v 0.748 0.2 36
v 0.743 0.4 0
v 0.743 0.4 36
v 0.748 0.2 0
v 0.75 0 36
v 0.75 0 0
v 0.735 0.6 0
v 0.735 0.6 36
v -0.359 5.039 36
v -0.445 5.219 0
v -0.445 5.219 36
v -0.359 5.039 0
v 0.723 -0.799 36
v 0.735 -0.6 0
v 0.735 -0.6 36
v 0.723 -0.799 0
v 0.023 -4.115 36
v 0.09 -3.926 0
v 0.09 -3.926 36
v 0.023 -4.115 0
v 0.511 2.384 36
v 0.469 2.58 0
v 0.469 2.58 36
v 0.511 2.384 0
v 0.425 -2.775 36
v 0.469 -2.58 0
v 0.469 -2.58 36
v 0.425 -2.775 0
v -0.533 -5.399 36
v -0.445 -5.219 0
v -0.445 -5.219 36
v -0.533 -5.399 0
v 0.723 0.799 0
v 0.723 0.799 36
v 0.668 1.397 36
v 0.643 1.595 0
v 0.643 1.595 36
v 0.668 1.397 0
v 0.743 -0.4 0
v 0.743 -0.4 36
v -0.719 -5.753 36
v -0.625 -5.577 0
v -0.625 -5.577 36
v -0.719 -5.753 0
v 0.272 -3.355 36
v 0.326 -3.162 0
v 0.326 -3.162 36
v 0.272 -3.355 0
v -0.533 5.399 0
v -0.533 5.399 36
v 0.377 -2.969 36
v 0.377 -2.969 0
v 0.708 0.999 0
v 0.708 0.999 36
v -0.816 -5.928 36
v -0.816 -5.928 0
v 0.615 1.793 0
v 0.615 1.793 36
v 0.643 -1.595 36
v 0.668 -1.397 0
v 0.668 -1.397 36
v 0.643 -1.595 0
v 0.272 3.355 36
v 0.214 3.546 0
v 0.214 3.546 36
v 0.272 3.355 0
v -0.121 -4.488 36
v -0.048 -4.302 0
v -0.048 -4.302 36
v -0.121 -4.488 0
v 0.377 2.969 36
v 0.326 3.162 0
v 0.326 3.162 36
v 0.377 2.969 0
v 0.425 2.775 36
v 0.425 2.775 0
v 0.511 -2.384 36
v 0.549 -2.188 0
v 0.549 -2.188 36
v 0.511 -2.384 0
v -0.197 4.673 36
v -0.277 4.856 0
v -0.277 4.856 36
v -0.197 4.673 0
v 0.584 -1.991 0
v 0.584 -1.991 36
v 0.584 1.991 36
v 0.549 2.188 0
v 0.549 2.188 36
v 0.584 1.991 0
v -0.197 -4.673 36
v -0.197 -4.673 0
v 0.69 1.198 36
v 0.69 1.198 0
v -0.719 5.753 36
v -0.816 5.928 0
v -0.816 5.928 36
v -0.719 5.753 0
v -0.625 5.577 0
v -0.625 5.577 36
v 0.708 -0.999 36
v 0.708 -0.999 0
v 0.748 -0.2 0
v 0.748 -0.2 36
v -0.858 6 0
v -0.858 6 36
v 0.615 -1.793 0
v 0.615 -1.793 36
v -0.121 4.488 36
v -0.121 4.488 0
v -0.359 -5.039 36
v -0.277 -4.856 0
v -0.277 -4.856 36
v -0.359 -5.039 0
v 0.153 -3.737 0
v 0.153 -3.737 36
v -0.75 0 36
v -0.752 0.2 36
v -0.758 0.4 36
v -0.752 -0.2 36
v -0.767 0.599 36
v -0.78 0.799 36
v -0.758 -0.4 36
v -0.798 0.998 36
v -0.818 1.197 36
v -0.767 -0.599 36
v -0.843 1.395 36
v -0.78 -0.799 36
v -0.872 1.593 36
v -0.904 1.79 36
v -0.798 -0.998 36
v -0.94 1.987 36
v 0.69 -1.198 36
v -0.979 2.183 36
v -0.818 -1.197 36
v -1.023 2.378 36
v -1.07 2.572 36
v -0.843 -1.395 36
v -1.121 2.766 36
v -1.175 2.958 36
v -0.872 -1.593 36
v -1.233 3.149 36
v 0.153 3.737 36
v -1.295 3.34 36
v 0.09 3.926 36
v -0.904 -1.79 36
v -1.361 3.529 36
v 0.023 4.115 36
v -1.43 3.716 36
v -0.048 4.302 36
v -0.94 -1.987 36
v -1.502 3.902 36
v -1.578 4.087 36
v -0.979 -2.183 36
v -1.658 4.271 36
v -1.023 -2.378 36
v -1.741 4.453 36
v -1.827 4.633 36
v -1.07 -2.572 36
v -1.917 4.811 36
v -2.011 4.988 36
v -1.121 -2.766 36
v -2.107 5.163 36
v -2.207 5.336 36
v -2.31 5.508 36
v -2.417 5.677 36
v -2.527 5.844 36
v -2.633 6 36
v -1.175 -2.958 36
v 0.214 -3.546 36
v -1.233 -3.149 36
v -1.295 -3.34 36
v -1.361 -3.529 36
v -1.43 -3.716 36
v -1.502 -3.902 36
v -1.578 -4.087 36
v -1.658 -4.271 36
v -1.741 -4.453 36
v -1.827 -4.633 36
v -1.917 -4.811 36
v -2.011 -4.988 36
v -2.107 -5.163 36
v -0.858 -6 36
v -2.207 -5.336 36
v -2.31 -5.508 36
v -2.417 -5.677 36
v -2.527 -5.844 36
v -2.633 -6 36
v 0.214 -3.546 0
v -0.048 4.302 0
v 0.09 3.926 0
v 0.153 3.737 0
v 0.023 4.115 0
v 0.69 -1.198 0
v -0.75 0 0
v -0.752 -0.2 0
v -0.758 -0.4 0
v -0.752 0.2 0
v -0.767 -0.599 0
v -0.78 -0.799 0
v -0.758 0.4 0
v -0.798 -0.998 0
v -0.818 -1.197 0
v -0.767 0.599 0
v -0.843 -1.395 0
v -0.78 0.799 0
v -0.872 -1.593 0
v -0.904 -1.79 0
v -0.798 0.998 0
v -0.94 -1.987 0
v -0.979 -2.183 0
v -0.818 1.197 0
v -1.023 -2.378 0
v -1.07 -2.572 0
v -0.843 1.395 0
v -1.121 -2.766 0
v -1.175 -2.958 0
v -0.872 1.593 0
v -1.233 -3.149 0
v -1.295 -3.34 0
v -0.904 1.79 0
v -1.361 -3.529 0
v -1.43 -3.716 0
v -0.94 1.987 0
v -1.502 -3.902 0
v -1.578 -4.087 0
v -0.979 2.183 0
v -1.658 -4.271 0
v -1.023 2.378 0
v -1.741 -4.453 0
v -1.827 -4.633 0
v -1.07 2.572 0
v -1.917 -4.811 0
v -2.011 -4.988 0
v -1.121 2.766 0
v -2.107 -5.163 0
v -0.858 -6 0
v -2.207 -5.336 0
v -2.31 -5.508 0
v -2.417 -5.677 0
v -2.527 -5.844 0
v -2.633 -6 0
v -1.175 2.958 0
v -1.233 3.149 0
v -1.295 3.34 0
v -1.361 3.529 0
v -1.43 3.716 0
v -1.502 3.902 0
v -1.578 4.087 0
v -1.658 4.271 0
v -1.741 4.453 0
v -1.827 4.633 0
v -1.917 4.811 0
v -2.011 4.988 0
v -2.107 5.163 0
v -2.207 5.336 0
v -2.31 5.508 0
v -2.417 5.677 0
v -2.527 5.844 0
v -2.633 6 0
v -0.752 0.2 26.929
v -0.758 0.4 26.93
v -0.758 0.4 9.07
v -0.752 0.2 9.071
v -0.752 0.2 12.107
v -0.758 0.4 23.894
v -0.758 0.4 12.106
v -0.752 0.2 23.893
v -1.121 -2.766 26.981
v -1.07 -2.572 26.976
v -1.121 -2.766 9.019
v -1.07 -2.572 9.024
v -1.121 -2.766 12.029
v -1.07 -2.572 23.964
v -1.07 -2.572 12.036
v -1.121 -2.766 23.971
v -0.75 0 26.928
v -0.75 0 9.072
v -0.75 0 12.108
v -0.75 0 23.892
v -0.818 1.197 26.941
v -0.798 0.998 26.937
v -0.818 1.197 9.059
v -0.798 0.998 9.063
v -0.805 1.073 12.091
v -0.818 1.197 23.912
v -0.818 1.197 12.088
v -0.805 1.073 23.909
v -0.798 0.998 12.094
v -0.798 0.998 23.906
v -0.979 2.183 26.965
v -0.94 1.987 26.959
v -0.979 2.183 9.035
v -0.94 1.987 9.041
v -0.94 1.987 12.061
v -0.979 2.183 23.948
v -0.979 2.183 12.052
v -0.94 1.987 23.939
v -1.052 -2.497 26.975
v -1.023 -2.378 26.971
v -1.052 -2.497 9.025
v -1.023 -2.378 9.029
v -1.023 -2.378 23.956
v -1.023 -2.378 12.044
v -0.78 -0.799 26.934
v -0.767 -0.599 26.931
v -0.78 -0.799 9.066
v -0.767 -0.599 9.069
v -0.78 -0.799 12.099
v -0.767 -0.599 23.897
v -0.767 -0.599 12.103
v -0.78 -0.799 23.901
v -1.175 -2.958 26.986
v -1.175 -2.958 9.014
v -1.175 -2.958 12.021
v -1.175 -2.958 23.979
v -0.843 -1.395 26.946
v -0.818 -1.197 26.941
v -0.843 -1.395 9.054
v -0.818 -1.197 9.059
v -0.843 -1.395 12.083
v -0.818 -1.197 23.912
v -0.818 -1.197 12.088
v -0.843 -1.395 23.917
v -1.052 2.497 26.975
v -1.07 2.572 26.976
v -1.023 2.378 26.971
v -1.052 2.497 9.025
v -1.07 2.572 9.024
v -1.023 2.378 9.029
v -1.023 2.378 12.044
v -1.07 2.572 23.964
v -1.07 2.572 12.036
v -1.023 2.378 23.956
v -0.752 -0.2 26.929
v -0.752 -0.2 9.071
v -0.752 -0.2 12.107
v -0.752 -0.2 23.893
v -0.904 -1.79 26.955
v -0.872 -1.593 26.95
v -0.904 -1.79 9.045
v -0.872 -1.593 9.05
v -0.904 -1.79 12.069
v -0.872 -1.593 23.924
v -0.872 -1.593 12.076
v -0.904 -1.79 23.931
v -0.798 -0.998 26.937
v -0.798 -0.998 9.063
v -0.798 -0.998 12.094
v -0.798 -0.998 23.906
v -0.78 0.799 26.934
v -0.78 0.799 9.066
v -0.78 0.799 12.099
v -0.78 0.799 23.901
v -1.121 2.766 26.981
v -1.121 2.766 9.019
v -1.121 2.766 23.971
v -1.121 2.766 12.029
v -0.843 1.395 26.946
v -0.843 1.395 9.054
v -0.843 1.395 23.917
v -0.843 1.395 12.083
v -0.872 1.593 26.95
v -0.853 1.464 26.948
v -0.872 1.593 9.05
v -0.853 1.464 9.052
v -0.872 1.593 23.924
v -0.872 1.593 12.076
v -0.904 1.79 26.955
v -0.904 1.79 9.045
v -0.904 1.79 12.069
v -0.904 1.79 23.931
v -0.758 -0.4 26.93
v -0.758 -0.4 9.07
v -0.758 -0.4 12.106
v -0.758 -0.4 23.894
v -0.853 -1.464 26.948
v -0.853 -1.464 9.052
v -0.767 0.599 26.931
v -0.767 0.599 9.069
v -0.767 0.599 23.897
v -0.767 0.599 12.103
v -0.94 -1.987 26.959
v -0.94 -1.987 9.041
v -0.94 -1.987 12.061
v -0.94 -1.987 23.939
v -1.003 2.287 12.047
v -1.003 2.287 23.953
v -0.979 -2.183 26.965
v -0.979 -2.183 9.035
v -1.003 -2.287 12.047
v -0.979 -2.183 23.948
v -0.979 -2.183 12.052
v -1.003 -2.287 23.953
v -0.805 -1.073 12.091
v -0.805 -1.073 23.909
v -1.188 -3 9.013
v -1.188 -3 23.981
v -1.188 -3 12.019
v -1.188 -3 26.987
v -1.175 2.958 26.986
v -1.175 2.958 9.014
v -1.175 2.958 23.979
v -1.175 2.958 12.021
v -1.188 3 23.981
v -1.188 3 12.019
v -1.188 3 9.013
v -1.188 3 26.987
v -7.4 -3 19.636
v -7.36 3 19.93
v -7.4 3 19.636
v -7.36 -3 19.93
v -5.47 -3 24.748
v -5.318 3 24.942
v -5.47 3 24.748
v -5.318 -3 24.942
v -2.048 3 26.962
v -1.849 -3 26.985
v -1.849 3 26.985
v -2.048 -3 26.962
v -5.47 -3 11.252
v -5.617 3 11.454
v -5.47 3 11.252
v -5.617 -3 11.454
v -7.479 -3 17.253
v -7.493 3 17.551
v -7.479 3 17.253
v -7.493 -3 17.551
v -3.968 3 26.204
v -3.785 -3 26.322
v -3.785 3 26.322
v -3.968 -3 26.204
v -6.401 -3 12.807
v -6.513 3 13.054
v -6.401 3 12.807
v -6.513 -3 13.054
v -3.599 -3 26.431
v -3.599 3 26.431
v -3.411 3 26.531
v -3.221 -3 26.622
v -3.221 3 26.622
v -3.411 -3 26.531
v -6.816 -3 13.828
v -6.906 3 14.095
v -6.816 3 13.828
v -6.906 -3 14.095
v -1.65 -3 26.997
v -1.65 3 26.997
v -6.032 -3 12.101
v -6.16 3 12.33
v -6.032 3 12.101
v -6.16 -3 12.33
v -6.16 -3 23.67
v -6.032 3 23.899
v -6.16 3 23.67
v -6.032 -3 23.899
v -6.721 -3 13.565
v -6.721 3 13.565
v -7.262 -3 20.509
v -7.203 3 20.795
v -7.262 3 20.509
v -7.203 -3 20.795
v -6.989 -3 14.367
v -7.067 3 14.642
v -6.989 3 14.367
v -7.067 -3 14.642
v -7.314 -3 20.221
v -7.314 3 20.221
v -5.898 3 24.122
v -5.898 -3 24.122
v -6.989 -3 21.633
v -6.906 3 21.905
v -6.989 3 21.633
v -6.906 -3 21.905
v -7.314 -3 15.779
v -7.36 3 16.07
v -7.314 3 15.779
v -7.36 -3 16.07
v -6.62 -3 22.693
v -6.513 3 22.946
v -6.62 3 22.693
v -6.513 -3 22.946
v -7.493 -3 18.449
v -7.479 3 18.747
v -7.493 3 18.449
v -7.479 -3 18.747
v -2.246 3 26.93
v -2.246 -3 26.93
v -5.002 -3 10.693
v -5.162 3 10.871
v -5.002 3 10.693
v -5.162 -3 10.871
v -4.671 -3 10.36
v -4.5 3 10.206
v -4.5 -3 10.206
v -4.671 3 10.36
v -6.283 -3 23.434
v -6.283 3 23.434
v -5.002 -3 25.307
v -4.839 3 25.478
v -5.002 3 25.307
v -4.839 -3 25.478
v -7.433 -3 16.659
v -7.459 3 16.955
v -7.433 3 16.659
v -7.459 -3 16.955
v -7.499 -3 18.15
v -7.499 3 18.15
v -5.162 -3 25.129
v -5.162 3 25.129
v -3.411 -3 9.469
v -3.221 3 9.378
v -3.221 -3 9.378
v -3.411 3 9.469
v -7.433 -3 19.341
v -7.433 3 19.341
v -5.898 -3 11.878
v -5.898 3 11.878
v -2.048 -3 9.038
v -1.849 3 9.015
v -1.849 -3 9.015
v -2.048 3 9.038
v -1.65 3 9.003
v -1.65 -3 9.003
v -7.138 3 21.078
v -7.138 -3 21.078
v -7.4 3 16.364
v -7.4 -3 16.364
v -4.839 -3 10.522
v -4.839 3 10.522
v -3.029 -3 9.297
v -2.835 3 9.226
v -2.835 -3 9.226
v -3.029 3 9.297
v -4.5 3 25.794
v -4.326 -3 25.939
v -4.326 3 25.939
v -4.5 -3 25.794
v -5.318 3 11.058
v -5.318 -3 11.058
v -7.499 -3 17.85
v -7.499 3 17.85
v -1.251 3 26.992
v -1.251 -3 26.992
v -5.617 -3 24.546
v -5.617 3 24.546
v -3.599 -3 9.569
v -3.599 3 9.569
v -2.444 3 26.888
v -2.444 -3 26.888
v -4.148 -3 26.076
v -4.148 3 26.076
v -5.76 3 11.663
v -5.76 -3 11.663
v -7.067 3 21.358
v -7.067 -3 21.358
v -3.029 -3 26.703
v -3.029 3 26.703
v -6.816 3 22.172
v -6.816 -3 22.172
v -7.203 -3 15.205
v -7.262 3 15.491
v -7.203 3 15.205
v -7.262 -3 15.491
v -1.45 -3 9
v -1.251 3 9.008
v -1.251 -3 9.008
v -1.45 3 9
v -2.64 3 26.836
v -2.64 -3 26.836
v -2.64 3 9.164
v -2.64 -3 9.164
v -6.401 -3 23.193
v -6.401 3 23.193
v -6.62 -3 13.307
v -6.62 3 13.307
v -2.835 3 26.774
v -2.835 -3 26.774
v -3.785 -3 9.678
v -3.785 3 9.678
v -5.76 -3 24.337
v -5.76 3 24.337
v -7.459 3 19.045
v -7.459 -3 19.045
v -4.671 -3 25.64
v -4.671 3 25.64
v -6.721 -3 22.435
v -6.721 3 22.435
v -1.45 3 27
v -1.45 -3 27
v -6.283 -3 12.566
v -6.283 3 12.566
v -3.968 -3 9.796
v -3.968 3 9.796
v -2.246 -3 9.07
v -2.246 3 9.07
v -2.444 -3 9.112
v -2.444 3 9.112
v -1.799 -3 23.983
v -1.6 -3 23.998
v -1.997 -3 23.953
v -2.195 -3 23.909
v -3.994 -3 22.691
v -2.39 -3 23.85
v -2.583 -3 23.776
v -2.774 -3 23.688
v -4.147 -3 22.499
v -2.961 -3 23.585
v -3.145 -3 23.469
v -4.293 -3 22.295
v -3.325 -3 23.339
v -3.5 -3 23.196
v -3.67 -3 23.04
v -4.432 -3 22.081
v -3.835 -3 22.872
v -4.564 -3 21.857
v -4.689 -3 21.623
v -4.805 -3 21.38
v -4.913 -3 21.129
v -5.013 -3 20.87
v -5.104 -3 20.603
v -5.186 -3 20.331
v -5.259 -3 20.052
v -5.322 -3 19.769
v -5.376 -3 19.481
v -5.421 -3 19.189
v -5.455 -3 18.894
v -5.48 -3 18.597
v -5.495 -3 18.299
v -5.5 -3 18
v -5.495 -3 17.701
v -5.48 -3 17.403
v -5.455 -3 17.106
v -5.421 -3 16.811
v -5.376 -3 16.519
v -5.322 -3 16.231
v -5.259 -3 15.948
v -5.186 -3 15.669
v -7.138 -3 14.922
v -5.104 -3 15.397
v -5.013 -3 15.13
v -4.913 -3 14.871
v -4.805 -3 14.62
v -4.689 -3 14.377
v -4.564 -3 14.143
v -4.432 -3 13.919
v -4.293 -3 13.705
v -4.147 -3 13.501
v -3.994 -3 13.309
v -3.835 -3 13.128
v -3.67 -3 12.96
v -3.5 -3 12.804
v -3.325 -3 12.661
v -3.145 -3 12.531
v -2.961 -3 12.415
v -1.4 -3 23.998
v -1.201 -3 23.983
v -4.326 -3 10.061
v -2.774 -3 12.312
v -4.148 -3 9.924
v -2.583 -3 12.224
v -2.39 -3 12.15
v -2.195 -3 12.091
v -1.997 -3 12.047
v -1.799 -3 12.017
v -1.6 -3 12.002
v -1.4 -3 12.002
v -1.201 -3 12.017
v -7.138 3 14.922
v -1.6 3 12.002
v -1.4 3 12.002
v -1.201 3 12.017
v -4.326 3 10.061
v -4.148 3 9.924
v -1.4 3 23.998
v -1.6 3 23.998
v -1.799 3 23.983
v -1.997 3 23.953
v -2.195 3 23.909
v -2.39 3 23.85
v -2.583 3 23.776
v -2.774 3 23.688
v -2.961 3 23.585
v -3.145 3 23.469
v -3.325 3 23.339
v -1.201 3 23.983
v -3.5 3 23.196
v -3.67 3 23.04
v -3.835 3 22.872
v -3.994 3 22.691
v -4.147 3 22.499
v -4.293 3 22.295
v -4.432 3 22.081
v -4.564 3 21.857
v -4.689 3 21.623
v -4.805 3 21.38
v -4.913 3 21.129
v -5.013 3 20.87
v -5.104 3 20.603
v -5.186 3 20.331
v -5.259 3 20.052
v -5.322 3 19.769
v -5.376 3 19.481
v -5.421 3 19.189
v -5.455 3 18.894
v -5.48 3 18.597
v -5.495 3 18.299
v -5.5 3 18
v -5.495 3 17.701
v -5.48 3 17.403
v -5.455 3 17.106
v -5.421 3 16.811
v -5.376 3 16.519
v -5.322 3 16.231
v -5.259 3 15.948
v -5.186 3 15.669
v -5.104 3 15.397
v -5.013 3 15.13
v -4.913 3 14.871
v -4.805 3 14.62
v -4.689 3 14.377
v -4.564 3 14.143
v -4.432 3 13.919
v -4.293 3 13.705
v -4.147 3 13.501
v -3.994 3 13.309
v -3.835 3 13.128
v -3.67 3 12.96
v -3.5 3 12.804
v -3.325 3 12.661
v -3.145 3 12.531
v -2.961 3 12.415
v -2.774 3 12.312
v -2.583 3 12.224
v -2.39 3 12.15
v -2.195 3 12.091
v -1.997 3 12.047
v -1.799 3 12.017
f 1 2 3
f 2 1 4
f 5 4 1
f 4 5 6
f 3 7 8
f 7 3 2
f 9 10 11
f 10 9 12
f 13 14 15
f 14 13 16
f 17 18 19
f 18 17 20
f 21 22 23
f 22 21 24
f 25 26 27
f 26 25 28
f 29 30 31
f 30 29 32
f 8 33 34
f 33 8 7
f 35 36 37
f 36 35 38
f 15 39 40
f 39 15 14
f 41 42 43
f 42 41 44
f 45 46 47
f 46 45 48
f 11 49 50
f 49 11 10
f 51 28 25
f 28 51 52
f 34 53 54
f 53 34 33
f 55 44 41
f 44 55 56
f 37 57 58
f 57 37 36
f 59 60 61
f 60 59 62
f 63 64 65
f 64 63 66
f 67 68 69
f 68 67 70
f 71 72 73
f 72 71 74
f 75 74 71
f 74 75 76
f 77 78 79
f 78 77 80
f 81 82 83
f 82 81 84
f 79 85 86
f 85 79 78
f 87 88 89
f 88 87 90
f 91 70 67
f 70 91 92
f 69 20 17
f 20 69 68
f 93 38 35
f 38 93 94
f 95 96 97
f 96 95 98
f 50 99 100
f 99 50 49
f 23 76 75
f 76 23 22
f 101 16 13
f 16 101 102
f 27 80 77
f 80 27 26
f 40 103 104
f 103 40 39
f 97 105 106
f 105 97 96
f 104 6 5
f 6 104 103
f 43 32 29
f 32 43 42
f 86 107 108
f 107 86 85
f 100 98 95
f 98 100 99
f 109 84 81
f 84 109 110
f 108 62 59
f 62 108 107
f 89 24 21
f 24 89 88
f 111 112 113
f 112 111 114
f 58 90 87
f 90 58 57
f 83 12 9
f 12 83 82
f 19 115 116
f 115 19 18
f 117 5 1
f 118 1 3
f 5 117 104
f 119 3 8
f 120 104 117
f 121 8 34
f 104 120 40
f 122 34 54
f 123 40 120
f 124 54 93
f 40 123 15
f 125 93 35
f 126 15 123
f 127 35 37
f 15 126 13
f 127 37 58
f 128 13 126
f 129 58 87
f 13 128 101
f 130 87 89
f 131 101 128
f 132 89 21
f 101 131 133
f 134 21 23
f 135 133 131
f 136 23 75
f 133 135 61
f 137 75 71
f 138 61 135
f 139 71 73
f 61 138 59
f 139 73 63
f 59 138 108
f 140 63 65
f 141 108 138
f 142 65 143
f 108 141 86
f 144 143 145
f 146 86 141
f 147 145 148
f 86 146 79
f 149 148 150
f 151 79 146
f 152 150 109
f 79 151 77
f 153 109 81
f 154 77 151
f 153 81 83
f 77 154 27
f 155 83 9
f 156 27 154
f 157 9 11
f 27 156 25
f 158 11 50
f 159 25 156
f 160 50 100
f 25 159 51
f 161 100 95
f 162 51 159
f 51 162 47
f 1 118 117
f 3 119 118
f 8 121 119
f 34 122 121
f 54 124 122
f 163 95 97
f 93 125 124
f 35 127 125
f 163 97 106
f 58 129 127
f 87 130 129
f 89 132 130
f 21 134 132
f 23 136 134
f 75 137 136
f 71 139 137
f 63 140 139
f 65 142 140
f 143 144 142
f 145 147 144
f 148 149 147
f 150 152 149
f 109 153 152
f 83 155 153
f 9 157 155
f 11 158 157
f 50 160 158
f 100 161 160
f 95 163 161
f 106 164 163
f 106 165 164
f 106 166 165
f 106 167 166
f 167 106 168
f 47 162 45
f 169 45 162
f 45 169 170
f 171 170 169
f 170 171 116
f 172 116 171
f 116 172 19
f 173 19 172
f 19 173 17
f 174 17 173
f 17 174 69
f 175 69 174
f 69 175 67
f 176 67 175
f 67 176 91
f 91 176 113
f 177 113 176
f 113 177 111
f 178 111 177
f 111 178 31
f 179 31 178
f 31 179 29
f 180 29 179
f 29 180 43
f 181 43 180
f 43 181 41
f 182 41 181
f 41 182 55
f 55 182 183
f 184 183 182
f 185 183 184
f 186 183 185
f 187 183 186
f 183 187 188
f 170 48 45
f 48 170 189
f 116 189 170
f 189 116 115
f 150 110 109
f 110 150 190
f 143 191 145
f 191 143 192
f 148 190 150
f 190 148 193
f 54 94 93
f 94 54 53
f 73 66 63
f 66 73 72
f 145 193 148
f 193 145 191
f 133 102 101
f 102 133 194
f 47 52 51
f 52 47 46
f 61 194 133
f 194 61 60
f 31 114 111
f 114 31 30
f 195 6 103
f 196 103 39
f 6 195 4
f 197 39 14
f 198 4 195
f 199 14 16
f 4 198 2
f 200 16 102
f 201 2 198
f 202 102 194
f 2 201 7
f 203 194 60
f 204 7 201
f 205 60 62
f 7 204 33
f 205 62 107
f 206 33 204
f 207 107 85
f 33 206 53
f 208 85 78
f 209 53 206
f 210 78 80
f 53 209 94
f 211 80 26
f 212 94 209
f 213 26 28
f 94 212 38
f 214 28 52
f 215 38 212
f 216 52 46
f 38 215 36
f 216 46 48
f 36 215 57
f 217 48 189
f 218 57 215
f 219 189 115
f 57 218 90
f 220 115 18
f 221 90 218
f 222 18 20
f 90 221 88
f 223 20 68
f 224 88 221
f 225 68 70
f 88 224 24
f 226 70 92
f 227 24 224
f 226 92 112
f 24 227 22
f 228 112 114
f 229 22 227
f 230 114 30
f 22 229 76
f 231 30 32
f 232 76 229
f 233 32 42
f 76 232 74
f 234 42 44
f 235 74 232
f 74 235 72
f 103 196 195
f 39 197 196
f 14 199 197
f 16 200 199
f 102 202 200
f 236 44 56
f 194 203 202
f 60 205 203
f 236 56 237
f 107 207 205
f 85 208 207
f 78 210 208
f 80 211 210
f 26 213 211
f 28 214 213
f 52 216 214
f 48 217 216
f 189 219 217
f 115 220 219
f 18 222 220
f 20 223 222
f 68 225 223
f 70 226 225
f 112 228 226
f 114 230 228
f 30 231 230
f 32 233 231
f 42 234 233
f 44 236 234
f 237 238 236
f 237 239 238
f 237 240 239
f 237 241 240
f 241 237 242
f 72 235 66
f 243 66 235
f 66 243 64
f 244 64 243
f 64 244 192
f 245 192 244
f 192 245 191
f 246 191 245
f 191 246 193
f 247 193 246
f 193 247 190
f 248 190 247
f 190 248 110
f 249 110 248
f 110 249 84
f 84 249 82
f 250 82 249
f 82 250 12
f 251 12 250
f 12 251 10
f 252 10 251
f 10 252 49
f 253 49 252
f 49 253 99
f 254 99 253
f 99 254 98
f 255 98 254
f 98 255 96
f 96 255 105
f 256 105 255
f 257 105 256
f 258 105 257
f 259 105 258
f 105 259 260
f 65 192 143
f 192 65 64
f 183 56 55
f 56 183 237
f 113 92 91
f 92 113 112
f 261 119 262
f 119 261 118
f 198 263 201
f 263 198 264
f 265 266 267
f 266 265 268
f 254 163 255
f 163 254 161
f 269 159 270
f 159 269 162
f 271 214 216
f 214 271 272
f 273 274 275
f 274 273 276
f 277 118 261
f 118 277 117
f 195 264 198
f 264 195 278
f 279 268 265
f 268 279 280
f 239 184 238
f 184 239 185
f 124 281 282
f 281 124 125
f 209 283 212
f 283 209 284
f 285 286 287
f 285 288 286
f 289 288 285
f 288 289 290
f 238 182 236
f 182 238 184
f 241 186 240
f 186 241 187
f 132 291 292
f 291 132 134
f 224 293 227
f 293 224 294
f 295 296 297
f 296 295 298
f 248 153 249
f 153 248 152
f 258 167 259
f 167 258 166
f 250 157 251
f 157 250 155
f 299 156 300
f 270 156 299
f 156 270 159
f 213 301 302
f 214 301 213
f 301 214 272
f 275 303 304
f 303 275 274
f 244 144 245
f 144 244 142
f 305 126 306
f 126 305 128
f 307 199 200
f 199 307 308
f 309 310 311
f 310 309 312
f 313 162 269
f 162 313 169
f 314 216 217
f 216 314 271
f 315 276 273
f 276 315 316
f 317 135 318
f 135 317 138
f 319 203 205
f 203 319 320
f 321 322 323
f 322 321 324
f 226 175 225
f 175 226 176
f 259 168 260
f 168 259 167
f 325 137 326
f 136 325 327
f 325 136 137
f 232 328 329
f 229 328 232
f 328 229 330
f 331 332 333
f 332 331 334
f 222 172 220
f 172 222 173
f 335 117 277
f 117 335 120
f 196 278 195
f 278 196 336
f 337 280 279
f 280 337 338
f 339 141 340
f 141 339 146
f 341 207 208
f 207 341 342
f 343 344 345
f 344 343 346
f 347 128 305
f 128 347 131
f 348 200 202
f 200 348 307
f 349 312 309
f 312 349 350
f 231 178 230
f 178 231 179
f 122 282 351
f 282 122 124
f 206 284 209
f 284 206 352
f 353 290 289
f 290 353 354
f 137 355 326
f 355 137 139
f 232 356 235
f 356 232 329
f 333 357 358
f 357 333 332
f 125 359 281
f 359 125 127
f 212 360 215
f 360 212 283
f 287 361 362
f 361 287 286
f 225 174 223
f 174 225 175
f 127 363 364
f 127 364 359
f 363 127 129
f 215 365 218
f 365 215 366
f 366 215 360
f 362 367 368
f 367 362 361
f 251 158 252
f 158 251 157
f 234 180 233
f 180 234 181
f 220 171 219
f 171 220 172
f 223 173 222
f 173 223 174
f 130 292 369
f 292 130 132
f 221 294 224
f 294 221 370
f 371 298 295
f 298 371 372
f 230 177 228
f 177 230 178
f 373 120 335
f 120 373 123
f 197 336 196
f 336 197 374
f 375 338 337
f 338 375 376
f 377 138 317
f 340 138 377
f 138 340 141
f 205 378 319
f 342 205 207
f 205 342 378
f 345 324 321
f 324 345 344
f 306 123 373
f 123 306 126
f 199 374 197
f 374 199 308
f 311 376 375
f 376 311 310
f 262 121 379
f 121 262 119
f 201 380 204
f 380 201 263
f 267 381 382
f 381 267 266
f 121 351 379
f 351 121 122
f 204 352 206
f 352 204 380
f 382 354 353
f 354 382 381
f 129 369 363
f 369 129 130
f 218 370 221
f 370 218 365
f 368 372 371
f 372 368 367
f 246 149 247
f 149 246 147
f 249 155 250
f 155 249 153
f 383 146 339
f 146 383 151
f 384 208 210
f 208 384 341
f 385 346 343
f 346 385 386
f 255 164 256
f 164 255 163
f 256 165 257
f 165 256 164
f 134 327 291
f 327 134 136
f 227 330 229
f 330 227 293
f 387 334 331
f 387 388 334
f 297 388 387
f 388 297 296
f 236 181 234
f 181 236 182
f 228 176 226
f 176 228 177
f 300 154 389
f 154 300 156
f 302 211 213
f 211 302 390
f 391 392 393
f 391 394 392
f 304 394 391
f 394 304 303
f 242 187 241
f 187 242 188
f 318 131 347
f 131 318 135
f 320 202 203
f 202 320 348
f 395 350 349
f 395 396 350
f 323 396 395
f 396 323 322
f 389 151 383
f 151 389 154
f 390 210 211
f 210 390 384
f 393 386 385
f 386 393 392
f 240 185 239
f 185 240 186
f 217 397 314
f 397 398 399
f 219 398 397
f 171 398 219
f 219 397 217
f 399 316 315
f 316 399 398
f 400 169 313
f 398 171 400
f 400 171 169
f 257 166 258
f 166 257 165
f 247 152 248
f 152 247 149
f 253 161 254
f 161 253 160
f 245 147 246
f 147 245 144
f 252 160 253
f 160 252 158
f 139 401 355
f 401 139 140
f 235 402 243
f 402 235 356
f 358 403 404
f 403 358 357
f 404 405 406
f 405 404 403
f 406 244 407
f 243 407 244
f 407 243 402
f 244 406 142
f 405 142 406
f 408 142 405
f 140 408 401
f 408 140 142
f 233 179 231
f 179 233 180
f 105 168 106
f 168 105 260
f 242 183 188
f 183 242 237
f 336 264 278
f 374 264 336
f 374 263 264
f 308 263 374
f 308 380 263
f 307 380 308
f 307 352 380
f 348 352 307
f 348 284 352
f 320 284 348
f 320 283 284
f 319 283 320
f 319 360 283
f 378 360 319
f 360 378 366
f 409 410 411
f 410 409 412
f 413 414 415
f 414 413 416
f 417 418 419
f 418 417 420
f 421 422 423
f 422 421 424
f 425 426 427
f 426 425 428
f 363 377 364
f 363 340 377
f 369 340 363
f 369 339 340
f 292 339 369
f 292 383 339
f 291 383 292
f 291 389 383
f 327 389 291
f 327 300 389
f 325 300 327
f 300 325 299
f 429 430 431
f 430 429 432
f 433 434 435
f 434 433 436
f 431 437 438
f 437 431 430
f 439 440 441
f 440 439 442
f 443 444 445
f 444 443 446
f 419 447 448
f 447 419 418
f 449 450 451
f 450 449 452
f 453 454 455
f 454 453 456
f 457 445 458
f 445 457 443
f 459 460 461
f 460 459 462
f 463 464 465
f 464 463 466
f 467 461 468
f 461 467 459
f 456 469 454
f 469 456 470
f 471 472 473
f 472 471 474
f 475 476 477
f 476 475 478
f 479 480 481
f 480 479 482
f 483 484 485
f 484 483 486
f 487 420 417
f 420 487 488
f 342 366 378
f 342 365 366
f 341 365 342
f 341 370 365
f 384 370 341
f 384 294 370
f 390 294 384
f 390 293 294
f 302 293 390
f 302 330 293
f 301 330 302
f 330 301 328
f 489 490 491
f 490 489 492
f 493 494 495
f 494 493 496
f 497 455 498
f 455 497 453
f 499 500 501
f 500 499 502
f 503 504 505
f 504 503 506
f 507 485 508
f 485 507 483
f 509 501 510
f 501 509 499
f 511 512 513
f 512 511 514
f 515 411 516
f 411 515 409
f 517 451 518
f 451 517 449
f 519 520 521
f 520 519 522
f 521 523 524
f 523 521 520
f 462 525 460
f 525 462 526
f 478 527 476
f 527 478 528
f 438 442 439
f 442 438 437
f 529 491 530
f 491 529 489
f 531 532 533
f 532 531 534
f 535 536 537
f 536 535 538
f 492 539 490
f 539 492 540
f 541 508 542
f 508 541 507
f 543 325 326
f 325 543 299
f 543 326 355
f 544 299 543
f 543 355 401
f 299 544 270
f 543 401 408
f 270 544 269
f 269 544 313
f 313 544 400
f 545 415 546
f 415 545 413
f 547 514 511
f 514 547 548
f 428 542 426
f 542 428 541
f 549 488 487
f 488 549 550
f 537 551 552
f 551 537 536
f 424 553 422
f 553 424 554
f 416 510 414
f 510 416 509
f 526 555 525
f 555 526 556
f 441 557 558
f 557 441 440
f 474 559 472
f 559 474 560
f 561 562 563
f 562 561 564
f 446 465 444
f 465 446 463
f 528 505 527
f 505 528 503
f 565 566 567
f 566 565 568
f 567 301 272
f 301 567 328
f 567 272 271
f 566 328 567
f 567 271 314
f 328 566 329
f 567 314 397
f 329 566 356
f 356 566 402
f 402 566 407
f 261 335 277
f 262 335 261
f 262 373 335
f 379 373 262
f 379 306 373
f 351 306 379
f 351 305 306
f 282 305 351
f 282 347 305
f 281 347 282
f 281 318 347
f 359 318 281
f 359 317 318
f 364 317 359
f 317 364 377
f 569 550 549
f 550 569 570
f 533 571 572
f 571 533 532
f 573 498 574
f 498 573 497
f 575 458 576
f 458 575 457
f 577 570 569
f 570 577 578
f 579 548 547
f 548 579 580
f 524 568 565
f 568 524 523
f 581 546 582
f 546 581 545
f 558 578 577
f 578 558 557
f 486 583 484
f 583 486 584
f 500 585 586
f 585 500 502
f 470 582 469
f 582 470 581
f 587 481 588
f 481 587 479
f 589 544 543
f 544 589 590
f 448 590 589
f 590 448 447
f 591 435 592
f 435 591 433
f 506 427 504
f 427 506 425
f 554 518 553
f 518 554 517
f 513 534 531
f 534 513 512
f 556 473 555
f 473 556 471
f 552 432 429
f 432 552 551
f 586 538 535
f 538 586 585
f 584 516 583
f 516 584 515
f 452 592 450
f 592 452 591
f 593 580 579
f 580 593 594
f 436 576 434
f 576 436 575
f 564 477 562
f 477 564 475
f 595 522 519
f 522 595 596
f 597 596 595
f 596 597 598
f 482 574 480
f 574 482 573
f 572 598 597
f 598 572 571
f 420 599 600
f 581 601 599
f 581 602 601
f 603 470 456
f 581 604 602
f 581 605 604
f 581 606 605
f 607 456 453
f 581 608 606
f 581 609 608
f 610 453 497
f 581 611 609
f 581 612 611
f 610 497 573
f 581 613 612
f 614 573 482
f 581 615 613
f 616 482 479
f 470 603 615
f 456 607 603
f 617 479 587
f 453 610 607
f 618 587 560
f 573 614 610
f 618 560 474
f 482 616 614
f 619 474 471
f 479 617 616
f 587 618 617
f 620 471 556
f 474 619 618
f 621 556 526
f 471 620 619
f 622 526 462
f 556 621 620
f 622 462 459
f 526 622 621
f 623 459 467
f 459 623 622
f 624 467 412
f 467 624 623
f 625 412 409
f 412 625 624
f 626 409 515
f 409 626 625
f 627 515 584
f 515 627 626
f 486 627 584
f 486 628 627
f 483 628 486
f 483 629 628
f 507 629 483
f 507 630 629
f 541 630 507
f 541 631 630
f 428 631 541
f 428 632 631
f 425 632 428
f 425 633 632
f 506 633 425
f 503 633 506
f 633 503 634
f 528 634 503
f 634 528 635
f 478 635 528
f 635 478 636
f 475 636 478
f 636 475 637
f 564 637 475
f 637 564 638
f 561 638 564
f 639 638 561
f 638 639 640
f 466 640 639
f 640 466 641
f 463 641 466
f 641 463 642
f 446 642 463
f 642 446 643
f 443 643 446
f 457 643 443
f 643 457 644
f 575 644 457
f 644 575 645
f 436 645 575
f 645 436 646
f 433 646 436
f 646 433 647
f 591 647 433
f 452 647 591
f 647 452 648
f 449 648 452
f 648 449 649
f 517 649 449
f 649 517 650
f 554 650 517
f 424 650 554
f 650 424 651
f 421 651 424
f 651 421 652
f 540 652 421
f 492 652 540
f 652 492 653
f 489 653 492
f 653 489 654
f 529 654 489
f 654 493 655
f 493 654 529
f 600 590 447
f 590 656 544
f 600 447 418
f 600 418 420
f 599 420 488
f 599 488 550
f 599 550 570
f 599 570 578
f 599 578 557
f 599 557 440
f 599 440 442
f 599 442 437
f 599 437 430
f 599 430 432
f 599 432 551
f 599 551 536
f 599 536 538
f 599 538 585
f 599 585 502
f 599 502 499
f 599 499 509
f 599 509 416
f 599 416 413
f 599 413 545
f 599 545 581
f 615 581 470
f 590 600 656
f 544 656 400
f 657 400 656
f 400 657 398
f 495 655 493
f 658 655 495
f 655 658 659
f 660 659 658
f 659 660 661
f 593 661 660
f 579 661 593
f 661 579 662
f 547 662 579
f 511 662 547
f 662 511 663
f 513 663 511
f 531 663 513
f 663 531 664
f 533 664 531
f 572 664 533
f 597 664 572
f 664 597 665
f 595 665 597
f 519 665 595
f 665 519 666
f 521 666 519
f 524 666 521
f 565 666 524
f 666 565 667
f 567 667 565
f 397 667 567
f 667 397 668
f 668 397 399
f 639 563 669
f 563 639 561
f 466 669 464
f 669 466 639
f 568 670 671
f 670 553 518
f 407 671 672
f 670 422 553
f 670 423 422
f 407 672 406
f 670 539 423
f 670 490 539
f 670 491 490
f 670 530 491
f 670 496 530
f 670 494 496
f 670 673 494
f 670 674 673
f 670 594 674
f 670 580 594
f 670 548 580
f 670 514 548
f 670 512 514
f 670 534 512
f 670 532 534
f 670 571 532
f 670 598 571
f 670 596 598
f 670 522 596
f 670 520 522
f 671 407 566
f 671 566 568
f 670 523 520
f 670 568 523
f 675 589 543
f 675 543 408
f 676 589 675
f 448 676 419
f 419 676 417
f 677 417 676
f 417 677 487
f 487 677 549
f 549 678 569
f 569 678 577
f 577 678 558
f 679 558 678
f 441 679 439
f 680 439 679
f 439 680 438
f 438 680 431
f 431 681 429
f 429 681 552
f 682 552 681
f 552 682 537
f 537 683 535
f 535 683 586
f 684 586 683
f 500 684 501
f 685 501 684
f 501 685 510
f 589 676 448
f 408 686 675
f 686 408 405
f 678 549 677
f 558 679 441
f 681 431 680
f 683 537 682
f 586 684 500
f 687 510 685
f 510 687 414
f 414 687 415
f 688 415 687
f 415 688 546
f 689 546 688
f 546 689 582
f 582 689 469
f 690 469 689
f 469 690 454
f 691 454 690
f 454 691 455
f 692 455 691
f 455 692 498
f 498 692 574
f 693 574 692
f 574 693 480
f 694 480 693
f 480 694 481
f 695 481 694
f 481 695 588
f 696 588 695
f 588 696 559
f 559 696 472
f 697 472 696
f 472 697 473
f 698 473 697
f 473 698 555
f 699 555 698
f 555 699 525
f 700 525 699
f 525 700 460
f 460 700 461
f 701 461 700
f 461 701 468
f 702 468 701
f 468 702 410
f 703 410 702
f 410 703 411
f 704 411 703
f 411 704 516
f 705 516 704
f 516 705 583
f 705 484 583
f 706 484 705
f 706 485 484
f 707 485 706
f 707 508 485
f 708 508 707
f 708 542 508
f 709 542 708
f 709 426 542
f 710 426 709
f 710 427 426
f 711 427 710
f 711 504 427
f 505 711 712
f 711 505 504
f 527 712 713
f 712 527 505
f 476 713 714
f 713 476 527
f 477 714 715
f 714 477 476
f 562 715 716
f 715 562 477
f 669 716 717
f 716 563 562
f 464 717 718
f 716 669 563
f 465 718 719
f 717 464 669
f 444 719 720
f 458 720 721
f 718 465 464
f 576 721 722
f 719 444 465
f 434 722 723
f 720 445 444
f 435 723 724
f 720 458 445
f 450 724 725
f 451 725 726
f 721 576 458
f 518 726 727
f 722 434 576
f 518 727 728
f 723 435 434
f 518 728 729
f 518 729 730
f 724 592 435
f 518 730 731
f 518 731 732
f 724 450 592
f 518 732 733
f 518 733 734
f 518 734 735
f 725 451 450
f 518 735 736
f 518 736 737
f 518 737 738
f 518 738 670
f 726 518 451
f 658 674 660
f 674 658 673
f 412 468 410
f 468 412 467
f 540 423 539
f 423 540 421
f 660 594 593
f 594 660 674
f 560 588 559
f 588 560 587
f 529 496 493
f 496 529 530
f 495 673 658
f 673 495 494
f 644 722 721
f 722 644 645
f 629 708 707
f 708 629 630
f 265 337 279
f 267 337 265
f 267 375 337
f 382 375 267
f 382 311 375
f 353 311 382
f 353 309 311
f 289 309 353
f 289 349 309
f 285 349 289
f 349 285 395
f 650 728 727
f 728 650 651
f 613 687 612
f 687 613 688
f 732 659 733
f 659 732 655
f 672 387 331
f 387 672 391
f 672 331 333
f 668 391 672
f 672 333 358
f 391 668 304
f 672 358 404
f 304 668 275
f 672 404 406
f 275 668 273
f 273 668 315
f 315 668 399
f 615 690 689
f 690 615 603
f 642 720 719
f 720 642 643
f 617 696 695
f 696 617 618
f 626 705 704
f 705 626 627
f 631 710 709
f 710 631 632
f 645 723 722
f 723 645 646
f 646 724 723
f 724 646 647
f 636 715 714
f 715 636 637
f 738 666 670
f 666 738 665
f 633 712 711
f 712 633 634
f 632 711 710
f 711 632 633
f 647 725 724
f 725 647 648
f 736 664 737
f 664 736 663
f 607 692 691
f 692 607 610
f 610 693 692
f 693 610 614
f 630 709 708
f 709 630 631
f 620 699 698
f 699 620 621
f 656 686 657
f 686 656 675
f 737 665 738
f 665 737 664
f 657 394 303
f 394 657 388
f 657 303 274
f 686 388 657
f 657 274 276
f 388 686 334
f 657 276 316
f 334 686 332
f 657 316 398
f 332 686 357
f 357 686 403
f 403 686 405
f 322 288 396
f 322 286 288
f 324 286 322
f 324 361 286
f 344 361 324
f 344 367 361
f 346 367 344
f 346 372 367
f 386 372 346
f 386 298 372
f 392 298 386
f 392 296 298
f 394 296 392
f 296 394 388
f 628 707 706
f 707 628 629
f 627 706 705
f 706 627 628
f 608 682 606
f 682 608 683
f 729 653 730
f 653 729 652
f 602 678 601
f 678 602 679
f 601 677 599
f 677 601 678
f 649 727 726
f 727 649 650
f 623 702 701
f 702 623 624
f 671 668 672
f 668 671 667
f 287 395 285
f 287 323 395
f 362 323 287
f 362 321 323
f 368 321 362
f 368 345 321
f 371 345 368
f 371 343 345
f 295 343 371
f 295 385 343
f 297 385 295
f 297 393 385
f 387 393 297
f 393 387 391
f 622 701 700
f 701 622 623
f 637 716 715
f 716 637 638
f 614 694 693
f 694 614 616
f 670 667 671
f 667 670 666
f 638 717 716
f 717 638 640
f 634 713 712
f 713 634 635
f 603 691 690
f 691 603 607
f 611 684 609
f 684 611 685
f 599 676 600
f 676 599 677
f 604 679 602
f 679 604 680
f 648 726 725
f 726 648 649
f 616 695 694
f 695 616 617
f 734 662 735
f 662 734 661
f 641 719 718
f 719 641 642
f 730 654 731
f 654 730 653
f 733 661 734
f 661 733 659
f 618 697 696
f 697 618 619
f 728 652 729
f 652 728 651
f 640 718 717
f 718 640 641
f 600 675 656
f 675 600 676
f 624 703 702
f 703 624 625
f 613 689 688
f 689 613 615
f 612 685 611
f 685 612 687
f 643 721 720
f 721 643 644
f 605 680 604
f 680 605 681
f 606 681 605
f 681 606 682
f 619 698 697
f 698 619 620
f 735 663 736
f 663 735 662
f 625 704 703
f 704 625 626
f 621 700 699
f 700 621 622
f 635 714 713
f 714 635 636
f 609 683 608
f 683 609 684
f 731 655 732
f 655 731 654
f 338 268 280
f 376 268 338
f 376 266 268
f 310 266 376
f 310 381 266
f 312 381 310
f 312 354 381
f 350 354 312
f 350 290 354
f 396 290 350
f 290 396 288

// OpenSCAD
// Parametric Shock Cord Mount created by: Nick Estes <nick@nickstoys.com>
// Released under a Creative Commons - share alike - attribution license

tube_diameter = 24;
base_thickness = 1.5;
length = 36;
loop_thickness = 2;
loop_height = 8;
loop_width = 6;
loop_length = 24;
base_width = 12;

$fa=.2;
$fs=.2;

module base() {
    translate([-tube_diameter/2+base_thickness/2,0,0]) intersection() {
        difference() {
            cylinder(length, r=tube_diameter/2);
            translate([0,0,-.5]) cylinder(length+1, r=tube_diameter/2-base_thickness);
        }
        translate([0,-base_width/2,0]) cube([tube_diameter, base_width, length]);
    }
}

module loop() {
    difference() {
        translate([-base_thickness,loop_width/2,length/2]) rotate([90,0,0]) scale([1,loop_length/2/loop_height,1]) difference() {
            cylinder(loop_width, r=loop_height/2+loop_thickness);
            translate([0,0,-.5]) cylinder(loop_width+1, r=loop_height/2);
        }
        translate([0,-loop_width/2-.5,-.5]) cube([loop_height+loop_thickness+1,loop_width+1,length+1]);
    }
}

union() {
    base();
    loop();
}
